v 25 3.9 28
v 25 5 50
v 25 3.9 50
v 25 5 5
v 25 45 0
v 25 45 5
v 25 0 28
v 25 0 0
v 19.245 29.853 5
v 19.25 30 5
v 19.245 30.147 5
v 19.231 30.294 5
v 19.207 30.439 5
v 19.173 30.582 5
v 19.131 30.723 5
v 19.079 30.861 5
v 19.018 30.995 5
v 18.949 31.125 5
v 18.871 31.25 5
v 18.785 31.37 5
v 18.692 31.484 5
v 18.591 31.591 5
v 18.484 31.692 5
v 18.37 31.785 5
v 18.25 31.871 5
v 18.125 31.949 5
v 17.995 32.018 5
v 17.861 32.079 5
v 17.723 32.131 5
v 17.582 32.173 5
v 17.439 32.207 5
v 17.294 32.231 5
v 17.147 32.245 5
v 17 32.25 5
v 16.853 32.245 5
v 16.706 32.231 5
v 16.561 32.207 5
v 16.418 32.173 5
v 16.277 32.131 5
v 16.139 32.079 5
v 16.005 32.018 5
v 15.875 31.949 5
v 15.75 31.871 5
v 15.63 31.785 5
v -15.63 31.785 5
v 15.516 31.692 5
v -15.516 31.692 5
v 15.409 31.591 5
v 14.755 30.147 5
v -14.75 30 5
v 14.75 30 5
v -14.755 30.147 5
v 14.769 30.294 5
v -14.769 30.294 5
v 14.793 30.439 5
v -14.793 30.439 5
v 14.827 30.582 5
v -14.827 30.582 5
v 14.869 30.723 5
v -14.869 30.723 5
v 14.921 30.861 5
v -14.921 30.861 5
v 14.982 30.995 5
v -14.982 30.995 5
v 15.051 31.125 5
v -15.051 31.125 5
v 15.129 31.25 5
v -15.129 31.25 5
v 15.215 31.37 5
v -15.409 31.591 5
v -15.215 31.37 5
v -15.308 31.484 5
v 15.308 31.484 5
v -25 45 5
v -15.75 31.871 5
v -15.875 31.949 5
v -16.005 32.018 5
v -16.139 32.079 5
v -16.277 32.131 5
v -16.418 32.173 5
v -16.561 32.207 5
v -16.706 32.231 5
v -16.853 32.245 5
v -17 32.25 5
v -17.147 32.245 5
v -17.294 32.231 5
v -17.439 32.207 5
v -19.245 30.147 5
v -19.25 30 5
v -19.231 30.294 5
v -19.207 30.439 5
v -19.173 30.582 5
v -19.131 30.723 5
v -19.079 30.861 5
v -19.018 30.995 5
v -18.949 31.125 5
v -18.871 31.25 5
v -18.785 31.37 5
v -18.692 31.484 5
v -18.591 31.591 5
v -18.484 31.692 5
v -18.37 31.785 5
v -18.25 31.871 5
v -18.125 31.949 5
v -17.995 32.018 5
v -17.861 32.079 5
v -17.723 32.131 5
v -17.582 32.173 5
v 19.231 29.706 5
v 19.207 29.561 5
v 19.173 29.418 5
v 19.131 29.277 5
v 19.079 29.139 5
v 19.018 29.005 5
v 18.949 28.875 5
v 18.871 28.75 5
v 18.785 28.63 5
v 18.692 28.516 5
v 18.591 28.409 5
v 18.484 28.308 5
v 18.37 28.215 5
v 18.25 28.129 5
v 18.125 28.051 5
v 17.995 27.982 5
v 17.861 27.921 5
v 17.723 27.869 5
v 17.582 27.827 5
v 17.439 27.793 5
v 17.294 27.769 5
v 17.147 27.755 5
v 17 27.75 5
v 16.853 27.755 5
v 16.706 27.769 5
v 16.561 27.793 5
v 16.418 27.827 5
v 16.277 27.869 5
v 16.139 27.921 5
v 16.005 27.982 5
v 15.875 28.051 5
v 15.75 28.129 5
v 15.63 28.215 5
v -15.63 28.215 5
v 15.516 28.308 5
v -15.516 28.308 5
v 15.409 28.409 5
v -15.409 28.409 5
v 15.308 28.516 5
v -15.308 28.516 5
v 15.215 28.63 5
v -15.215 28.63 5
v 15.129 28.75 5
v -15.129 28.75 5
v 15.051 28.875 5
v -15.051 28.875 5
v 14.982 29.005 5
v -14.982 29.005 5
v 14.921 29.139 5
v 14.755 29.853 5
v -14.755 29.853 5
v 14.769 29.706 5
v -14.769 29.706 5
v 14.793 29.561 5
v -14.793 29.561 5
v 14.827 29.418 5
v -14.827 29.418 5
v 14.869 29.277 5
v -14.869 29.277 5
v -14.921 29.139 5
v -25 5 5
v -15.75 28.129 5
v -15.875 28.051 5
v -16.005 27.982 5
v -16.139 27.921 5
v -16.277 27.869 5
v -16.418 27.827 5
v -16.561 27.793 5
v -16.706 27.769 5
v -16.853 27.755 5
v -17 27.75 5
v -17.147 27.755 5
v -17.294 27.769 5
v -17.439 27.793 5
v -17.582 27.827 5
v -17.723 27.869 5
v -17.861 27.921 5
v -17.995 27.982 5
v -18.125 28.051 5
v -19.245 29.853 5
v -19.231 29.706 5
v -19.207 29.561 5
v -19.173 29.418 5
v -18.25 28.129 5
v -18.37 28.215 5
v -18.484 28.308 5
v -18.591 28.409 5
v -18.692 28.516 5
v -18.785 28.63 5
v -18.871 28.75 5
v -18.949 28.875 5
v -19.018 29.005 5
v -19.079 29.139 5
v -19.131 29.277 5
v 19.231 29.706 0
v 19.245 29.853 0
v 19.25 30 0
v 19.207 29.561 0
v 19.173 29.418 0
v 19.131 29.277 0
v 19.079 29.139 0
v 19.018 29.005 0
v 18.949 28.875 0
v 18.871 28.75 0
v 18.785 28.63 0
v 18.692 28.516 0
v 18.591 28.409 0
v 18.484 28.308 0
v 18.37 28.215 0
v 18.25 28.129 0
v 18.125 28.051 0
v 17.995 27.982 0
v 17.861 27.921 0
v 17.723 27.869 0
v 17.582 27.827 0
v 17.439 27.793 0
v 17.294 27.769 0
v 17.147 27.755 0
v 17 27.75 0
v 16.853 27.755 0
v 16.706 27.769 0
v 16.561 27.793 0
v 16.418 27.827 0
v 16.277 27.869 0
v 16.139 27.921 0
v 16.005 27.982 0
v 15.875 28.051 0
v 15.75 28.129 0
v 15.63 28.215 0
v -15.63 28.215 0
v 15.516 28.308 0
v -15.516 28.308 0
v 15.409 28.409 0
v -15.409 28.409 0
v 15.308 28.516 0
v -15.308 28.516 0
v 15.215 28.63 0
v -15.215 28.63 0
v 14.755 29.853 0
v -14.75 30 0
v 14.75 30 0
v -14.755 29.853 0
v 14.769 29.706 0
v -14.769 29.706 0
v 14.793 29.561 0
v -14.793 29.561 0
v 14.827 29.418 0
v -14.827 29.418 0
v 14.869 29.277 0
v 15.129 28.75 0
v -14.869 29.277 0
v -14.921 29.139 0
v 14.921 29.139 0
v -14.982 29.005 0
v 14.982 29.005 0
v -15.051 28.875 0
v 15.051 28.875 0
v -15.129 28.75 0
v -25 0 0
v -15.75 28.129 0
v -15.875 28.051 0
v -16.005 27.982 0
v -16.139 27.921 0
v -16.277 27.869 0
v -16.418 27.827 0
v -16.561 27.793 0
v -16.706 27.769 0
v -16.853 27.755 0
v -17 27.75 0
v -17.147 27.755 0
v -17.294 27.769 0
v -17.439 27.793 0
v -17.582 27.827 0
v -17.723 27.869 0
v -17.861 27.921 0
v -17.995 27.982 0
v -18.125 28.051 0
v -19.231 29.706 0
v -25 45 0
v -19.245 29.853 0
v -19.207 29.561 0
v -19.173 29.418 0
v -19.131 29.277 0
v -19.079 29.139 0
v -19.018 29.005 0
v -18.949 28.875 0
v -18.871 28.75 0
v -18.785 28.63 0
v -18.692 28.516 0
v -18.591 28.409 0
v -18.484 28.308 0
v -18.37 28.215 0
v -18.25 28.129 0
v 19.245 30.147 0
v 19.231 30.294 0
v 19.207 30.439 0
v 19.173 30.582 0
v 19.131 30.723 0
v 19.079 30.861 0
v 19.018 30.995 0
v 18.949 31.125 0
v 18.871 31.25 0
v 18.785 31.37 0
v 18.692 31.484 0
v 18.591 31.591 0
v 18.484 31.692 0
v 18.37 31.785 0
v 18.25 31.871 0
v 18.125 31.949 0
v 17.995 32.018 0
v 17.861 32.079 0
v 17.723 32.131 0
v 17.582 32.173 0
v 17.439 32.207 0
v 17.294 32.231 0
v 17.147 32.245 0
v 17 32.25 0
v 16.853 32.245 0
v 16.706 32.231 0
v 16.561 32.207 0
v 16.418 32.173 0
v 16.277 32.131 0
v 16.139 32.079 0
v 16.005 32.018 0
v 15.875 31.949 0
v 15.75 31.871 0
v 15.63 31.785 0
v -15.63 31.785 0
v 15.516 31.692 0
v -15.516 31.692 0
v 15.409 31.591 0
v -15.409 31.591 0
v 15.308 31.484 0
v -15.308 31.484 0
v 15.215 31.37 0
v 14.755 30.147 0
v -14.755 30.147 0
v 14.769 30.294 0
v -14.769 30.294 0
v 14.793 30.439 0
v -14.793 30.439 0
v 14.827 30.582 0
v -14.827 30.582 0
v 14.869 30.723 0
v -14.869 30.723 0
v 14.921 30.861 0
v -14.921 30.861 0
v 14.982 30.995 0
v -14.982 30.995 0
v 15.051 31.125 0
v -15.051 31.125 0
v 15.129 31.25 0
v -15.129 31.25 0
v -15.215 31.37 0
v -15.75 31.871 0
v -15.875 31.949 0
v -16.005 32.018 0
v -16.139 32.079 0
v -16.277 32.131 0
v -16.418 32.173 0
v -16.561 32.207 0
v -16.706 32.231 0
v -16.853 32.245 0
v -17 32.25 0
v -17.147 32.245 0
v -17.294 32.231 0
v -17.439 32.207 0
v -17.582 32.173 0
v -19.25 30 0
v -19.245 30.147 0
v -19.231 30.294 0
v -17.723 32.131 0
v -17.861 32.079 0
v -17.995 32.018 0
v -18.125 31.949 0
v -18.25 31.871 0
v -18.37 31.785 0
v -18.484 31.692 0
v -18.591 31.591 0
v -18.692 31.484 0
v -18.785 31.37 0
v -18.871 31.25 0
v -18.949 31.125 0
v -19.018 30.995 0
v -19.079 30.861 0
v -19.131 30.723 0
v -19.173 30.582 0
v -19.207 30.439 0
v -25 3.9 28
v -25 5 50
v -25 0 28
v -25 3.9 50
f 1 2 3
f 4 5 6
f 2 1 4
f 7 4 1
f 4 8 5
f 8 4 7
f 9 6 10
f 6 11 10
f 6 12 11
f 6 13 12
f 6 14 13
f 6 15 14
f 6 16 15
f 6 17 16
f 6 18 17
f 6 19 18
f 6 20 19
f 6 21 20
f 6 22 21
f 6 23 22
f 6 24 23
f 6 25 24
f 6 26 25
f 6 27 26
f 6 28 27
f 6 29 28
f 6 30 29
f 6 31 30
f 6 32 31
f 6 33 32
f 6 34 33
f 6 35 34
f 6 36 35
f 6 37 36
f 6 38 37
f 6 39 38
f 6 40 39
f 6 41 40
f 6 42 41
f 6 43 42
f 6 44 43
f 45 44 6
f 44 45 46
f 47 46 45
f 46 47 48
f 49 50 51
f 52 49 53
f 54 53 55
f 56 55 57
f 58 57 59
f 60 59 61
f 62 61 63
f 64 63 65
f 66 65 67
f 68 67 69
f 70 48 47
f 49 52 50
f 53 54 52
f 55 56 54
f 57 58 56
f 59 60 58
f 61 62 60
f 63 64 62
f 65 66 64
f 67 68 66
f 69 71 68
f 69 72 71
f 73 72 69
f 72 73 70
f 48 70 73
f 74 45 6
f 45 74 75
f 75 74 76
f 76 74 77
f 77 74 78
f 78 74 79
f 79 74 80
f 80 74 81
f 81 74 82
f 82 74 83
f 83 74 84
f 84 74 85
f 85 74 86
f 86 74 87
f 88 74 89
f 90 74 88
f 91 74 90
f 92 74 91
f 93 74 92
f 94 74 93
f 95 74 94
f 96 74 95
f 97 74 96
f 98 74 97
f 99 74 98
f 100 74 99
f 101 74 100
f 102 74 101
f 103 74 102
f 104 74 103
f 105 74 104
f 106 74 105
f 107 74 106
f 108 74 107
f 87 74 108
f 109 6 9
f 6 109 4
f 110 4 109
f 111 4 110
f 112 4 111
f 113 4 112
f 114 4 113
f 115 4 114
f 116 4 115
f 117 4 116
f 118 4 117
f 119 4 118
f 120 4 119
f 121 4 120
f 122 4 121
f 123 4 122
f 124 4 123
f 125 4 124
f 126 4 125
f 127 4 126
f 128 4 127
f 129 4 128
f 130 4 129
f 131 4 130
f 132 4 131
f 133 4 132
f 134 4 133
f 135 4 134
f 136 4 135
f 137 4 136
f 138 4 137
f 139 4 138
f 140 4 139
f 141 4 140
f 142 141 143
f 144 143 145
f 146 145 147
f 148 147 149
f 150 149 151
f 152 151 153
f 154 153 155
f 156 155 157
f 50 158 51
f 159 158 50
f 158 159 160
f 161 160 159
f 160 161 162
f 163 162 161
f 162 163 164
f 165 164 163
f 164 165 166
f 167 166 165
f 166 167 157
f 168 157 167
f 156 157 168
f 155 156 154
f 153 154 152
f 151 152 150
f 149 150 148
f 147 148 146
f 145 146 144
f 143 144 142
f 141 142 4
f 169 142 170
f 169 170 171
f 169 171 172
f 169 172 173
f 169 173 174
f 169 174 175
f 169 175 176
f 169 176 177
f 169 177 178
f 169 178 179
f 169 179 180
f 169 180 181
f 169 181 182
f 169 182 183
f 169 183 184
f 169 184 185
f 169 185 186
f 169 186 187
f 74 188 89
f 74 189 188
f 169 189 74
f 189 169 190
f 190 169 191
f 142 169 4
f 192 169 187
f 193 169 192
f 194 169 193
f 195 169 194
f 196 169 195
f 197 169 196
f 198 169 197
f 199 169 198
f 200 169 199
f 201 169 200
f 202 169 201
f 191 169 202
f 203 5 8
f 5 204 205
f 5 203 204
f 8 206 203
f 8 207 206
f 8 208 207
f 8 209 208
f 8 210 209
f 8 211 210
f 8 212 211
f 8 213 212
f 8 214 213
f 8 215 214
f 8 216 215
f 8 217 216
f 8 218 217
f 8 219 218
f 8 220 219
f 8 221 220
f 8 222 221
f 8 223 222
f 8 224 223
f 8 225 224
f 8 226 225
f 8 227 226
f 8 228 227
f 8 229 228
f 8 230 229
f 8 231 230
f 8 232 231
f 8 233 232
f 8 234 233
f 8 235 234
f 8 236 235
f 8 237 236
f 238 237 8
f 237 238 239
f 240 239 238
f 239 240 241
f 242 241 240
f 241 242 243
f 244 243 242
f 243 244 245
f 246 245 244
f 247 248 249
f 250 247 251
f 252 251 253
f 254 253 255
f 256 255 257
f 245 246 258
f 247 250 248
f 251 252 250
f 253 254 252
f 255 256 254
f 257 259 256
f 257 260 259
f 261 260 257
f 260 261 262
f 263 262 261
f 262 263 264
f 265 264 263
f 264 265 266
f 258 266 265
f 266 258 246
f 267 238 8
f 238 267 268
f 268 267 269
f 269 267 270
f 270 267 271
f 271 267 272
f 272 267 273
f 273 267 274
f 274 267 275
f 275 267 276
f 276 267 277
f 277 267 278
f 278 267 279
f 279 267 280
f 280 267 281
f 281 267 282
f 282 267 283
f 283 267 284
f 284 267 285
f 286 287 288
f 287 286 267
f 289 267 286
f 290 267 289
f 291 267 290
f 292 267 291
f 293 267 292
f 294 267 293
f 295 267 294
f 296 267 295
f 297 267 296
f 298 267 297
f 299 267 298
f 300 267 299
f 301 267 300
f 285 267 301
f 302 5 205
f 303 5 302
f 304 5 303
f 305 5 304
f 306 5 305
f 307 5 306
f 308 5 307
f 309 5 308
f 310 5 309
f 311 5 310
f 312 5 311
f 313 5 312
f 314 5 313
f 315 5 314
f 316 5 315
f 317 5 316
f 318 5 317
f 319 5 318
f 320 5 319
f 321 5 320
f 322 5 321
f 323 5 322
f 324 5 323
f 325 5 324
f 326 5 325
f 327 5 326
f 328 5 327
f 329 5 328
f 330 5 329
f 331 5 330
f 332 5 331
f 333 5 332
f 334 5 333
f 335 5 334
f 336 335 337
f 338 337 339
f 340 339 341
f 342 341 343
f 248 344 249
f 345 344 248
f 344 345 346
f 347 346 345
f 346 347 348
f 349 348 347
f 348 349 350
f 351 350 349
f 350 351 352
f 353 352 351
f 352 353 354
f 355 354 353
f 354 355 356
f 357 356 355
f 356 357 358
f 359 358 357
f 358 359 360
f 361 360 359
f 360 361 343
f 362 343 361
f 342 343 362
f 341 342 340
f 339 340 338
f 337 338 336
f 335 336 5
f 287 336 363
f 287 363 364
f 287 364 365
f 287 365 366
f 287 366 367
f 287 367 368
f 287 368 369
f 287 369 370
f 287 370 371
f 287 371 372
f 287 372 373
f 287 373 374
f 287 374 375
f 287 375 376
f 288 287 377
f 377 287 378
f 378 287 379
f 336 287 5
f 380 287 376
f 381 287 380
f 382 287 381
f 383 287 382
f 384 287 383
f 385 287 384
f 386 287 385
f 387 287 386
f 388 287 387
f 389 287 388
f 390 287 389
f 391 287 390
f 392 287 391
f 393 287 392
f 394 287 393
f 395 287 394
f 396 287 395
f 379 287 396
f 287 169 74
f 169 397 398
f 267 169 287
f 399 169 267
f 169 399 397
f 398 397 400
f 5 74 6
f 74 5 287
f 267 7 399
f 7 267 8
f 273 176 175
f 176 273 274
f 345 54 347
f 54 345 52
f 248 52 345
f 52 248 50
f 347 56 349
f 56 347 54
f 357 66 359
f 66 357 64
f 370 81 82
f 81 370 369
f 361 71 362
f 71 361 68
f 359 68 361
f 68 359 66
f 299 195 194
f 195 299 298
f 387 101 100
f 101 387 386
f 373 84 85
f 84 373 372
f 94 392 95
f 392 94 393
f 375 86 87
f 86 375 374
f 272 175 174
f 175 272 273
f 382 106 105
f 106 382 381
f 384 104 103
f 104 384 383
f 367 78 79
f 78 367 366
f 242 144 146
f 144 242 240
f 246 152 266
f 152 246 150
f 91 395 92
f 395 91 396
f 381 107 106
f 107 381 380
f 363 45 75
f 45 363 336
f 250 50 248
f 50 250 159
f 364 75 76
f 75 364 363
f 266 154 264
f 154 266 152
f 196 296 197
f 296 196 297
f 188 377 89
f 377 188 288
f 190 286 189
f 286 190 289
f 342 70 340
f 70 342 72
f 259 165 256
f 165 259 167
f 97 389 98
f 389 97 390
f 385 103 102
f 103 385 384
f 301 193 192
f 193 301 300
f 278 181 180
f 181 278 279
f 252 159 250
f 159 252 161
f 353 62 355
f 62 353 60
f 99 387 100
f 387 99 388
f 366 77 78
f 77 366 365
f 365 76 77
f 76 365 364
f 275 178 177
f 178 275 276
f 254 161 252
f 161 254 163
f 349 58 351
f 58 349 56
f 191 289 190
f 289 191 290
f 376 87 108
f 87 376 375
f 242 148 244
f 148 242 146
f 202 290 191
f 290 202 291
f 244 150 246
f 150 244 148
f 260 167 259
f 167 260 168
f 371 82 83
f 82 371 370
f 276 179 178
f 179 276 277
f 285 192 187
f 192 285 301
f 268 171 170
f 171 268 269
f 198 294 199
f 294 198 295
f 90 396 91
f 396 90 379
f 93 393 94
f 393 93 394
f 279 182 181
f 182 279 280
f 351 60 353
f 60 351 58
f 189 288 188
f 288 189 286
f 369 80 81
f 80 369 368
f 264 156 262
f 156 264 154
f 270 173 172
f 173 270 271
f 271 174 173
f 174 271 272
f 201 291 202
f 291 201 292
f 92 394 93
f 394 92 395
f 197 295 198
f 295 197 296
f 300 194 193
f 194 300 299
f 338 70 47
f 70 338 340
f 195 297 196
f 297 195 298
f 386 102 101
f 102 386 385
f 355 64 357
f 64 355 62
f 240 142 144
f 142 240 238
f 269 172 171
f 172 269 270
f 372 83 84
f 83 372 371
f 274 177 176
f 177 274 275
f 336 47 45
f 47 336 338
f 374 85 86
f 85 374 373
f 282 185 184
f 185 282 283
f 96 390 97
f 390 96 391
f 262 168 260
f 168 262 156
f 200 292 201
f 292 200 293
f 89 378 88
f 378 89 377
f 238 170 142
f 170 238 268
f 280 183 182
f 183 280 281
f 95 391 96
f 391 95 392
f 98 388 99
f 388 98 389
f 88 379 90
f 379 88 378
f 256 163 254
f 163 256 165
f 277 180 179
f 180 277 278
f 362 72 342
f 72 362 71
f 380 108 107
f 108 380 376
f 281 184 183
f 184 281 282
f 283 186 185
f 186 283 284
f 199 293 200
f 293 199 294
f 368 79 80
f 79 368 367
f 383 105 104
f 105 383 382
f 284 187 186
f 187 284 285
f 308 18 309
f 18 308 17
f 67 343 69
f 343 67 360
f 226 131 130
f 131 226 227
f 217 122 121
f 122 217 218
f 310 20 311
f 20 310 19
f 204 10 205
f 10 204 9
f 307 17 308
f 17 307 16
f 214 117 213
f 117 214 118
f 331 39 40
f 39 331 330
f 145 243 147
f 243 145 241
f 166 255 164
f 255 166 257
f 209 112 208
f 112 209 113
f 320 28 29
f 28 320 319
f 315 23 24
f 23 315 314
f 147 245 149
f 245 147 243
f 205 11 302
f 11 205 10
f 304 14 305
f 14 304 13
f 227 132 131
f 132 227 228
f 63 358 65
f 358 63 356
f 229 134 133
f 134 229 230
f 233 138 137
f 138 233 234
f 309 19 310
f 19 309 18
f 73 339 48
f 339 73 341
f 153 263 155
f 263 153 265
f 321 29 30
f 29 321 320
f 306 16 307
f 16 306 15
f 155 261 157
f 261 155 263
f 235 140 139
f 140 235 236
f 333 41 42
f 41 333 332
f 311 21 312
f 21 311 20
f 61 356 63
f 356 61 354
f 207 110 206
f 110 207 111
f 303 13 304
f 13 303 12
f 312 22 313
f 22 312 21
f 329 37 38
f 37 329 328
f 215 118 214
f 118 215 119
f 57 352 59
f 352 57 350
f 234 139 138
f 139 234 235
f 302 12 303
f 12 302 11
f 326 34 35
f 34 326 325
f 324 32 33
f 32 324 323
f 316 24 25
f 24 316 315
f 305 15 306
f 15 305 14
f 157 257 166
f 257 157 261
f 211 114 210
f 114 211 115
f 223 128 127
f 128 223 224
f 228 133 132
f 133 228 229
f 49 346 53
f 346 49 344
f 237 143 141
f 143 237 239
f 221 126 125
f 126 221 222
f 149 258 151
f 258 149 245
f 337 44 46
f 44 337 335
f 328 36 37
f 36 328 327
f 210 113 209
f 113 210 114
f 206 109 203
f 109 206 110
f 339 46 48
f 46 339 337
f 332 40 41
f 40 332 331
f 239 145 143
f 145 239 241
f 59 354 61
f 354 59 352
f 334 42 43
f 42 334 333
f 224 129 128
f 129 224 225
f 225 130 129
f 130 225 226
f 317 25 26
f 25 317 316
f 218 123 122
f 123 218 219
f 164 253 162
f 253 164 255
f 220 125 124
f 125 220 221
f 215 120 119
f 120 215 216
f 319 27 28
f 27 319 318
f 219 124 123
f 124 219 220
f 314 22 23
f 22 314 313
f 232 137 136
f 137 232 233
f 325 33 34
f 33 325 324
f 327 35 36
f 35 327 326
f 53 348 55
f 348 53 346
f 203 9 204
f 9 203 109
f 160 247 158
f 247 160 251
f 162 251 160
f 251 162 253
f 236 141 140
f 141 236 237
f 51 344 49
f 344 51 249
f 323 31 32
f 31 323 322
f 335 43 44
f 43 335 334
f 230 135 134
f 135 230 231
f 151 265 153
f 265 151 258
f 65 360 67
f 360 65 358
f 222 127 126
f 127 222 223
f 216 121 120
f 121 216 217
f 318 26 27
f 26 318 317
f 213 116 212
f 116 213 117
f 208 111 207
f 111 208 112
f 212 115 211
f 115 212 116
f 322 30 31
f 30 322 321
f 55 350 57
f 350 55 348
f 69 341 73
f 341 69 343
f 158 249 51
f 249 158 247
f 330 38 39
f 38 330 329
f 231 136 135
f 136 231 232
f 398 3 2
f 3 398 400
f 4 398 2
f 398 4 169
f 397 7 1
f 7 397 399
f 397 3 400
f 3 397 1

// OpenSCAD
// L-shaped mounting bracket for NEMA 17 stepper motor
// Print orientation: base plate on bed, motor plate builds upward (+Z)

// ---------------- Parameters ----------------
base_x0      = -25;    // base plate start in X
base_x1      = 25;     // base plate end in X
base_y0      = 0;      // base plate start in Y
base_y1      = 45;     // base plate end in Y
base_z0      = 0;      // base plate start in Z
base_z1      = 5;      // base plate end in Z

hole_x       = -17;    // M4 hole 1, X position
hole_y       = 30;     // M4 hole 1, Y position
hole_d       = 4.5;    // M4 hole diameter

hole_x2      = 17;     // M4 hole 2, X position

plate_x0     = -25;    // motor plate start in X
plate_x1     = 25;     // motor plate end in X
plate_y0     = 0;      // motor plate start in Y
plate_y1     = 5;      // motor plate end in Y
plate_z0     = 0;      // motor plate start in Z
plate_z1     = 50;     // motor plate end in Z

hole_d2      = 23;     // motor centring boss hole diameter
hole_z2      = 28;     // motor centring boss hole Z position

screw_d      = 3.4;    // M3 screw hole diameter
screw_x      = -15.5;  // M3 screw pattern centre X offset (31 mm square)
screw_y      = -15.5;  // M3 screw pattern centre Y offset

gusset_x0    = -25;    // gusset left edge (X)
gusset_x1    = -20;    // gusset right edge (X)
gusset_y0    = 5;      // gusset leg length in Y (from z = 5)
gusset_z0    = 5;      // gusset leg length in Z (from y = 5)

eps          = 0.5;    // cutter overshoot past faces

$fn = 96;

// ---------------- Model ----------------
union() {
    // Base plate with M4 through-holes
    difference() {
        translate([base_x0, base_y0, base_z0])
            cube([base_x1 - base_x0, base_y1 - base_y0, base_z1 - base_z0]);
        translate([hole_x, hole_y, -eps])
            cylinder(d = hole_d, h = base_z1 - base_z0 + 2 * eps);
        translate([hole_x2, hole_y, -eps])
            cylinder(d = hole_d, h = base_z1 - base_z0 + 2 * eps);
    }

    // Vertical motor plate with boss hole and M3 screw holes
    difference() {
        translate([plate_x0, plate_y0, plate_z0])
            cube([plate_x1 - plate_x0, plate_y1 - plate_y0, plate_z1 - plate_z0]);
        translate([screw_x, plate_y0, -eps])
            cube([screw_x + 31, plate_y1, screw_d + 2 * eps]);
        translate([screw_x, plate_y1, -eps])
            cube([screw_x + 31, plate_y0, screw_d + 2 * eps]);
        translate([plate_x0, -eps, hole_z2])
            cube([plate_x1 - plate_x0, screw_d + 2 * eps, plate_z1 - hole_z2 + eps]);
        translate([plate_x0, -eps, hole_z2])
            cube([plate_x1 - plate_x0, screw_d + 2 * eps, hole_z2 - plate_z0 + eps]);
    }

    // Triangular gussets, flush with plate edges
    for (gx = [gusset_x0, gusset_x1])
        translate([gx, gusset_y0, gusset_z0])
            rotate([0, 90, 0])
                linear_extrude(height = 5)
                    polygon([
                        [0, 0],
                        [gusset_y0, 0],
                        [0, gusset_z0]
                    ]);
}
